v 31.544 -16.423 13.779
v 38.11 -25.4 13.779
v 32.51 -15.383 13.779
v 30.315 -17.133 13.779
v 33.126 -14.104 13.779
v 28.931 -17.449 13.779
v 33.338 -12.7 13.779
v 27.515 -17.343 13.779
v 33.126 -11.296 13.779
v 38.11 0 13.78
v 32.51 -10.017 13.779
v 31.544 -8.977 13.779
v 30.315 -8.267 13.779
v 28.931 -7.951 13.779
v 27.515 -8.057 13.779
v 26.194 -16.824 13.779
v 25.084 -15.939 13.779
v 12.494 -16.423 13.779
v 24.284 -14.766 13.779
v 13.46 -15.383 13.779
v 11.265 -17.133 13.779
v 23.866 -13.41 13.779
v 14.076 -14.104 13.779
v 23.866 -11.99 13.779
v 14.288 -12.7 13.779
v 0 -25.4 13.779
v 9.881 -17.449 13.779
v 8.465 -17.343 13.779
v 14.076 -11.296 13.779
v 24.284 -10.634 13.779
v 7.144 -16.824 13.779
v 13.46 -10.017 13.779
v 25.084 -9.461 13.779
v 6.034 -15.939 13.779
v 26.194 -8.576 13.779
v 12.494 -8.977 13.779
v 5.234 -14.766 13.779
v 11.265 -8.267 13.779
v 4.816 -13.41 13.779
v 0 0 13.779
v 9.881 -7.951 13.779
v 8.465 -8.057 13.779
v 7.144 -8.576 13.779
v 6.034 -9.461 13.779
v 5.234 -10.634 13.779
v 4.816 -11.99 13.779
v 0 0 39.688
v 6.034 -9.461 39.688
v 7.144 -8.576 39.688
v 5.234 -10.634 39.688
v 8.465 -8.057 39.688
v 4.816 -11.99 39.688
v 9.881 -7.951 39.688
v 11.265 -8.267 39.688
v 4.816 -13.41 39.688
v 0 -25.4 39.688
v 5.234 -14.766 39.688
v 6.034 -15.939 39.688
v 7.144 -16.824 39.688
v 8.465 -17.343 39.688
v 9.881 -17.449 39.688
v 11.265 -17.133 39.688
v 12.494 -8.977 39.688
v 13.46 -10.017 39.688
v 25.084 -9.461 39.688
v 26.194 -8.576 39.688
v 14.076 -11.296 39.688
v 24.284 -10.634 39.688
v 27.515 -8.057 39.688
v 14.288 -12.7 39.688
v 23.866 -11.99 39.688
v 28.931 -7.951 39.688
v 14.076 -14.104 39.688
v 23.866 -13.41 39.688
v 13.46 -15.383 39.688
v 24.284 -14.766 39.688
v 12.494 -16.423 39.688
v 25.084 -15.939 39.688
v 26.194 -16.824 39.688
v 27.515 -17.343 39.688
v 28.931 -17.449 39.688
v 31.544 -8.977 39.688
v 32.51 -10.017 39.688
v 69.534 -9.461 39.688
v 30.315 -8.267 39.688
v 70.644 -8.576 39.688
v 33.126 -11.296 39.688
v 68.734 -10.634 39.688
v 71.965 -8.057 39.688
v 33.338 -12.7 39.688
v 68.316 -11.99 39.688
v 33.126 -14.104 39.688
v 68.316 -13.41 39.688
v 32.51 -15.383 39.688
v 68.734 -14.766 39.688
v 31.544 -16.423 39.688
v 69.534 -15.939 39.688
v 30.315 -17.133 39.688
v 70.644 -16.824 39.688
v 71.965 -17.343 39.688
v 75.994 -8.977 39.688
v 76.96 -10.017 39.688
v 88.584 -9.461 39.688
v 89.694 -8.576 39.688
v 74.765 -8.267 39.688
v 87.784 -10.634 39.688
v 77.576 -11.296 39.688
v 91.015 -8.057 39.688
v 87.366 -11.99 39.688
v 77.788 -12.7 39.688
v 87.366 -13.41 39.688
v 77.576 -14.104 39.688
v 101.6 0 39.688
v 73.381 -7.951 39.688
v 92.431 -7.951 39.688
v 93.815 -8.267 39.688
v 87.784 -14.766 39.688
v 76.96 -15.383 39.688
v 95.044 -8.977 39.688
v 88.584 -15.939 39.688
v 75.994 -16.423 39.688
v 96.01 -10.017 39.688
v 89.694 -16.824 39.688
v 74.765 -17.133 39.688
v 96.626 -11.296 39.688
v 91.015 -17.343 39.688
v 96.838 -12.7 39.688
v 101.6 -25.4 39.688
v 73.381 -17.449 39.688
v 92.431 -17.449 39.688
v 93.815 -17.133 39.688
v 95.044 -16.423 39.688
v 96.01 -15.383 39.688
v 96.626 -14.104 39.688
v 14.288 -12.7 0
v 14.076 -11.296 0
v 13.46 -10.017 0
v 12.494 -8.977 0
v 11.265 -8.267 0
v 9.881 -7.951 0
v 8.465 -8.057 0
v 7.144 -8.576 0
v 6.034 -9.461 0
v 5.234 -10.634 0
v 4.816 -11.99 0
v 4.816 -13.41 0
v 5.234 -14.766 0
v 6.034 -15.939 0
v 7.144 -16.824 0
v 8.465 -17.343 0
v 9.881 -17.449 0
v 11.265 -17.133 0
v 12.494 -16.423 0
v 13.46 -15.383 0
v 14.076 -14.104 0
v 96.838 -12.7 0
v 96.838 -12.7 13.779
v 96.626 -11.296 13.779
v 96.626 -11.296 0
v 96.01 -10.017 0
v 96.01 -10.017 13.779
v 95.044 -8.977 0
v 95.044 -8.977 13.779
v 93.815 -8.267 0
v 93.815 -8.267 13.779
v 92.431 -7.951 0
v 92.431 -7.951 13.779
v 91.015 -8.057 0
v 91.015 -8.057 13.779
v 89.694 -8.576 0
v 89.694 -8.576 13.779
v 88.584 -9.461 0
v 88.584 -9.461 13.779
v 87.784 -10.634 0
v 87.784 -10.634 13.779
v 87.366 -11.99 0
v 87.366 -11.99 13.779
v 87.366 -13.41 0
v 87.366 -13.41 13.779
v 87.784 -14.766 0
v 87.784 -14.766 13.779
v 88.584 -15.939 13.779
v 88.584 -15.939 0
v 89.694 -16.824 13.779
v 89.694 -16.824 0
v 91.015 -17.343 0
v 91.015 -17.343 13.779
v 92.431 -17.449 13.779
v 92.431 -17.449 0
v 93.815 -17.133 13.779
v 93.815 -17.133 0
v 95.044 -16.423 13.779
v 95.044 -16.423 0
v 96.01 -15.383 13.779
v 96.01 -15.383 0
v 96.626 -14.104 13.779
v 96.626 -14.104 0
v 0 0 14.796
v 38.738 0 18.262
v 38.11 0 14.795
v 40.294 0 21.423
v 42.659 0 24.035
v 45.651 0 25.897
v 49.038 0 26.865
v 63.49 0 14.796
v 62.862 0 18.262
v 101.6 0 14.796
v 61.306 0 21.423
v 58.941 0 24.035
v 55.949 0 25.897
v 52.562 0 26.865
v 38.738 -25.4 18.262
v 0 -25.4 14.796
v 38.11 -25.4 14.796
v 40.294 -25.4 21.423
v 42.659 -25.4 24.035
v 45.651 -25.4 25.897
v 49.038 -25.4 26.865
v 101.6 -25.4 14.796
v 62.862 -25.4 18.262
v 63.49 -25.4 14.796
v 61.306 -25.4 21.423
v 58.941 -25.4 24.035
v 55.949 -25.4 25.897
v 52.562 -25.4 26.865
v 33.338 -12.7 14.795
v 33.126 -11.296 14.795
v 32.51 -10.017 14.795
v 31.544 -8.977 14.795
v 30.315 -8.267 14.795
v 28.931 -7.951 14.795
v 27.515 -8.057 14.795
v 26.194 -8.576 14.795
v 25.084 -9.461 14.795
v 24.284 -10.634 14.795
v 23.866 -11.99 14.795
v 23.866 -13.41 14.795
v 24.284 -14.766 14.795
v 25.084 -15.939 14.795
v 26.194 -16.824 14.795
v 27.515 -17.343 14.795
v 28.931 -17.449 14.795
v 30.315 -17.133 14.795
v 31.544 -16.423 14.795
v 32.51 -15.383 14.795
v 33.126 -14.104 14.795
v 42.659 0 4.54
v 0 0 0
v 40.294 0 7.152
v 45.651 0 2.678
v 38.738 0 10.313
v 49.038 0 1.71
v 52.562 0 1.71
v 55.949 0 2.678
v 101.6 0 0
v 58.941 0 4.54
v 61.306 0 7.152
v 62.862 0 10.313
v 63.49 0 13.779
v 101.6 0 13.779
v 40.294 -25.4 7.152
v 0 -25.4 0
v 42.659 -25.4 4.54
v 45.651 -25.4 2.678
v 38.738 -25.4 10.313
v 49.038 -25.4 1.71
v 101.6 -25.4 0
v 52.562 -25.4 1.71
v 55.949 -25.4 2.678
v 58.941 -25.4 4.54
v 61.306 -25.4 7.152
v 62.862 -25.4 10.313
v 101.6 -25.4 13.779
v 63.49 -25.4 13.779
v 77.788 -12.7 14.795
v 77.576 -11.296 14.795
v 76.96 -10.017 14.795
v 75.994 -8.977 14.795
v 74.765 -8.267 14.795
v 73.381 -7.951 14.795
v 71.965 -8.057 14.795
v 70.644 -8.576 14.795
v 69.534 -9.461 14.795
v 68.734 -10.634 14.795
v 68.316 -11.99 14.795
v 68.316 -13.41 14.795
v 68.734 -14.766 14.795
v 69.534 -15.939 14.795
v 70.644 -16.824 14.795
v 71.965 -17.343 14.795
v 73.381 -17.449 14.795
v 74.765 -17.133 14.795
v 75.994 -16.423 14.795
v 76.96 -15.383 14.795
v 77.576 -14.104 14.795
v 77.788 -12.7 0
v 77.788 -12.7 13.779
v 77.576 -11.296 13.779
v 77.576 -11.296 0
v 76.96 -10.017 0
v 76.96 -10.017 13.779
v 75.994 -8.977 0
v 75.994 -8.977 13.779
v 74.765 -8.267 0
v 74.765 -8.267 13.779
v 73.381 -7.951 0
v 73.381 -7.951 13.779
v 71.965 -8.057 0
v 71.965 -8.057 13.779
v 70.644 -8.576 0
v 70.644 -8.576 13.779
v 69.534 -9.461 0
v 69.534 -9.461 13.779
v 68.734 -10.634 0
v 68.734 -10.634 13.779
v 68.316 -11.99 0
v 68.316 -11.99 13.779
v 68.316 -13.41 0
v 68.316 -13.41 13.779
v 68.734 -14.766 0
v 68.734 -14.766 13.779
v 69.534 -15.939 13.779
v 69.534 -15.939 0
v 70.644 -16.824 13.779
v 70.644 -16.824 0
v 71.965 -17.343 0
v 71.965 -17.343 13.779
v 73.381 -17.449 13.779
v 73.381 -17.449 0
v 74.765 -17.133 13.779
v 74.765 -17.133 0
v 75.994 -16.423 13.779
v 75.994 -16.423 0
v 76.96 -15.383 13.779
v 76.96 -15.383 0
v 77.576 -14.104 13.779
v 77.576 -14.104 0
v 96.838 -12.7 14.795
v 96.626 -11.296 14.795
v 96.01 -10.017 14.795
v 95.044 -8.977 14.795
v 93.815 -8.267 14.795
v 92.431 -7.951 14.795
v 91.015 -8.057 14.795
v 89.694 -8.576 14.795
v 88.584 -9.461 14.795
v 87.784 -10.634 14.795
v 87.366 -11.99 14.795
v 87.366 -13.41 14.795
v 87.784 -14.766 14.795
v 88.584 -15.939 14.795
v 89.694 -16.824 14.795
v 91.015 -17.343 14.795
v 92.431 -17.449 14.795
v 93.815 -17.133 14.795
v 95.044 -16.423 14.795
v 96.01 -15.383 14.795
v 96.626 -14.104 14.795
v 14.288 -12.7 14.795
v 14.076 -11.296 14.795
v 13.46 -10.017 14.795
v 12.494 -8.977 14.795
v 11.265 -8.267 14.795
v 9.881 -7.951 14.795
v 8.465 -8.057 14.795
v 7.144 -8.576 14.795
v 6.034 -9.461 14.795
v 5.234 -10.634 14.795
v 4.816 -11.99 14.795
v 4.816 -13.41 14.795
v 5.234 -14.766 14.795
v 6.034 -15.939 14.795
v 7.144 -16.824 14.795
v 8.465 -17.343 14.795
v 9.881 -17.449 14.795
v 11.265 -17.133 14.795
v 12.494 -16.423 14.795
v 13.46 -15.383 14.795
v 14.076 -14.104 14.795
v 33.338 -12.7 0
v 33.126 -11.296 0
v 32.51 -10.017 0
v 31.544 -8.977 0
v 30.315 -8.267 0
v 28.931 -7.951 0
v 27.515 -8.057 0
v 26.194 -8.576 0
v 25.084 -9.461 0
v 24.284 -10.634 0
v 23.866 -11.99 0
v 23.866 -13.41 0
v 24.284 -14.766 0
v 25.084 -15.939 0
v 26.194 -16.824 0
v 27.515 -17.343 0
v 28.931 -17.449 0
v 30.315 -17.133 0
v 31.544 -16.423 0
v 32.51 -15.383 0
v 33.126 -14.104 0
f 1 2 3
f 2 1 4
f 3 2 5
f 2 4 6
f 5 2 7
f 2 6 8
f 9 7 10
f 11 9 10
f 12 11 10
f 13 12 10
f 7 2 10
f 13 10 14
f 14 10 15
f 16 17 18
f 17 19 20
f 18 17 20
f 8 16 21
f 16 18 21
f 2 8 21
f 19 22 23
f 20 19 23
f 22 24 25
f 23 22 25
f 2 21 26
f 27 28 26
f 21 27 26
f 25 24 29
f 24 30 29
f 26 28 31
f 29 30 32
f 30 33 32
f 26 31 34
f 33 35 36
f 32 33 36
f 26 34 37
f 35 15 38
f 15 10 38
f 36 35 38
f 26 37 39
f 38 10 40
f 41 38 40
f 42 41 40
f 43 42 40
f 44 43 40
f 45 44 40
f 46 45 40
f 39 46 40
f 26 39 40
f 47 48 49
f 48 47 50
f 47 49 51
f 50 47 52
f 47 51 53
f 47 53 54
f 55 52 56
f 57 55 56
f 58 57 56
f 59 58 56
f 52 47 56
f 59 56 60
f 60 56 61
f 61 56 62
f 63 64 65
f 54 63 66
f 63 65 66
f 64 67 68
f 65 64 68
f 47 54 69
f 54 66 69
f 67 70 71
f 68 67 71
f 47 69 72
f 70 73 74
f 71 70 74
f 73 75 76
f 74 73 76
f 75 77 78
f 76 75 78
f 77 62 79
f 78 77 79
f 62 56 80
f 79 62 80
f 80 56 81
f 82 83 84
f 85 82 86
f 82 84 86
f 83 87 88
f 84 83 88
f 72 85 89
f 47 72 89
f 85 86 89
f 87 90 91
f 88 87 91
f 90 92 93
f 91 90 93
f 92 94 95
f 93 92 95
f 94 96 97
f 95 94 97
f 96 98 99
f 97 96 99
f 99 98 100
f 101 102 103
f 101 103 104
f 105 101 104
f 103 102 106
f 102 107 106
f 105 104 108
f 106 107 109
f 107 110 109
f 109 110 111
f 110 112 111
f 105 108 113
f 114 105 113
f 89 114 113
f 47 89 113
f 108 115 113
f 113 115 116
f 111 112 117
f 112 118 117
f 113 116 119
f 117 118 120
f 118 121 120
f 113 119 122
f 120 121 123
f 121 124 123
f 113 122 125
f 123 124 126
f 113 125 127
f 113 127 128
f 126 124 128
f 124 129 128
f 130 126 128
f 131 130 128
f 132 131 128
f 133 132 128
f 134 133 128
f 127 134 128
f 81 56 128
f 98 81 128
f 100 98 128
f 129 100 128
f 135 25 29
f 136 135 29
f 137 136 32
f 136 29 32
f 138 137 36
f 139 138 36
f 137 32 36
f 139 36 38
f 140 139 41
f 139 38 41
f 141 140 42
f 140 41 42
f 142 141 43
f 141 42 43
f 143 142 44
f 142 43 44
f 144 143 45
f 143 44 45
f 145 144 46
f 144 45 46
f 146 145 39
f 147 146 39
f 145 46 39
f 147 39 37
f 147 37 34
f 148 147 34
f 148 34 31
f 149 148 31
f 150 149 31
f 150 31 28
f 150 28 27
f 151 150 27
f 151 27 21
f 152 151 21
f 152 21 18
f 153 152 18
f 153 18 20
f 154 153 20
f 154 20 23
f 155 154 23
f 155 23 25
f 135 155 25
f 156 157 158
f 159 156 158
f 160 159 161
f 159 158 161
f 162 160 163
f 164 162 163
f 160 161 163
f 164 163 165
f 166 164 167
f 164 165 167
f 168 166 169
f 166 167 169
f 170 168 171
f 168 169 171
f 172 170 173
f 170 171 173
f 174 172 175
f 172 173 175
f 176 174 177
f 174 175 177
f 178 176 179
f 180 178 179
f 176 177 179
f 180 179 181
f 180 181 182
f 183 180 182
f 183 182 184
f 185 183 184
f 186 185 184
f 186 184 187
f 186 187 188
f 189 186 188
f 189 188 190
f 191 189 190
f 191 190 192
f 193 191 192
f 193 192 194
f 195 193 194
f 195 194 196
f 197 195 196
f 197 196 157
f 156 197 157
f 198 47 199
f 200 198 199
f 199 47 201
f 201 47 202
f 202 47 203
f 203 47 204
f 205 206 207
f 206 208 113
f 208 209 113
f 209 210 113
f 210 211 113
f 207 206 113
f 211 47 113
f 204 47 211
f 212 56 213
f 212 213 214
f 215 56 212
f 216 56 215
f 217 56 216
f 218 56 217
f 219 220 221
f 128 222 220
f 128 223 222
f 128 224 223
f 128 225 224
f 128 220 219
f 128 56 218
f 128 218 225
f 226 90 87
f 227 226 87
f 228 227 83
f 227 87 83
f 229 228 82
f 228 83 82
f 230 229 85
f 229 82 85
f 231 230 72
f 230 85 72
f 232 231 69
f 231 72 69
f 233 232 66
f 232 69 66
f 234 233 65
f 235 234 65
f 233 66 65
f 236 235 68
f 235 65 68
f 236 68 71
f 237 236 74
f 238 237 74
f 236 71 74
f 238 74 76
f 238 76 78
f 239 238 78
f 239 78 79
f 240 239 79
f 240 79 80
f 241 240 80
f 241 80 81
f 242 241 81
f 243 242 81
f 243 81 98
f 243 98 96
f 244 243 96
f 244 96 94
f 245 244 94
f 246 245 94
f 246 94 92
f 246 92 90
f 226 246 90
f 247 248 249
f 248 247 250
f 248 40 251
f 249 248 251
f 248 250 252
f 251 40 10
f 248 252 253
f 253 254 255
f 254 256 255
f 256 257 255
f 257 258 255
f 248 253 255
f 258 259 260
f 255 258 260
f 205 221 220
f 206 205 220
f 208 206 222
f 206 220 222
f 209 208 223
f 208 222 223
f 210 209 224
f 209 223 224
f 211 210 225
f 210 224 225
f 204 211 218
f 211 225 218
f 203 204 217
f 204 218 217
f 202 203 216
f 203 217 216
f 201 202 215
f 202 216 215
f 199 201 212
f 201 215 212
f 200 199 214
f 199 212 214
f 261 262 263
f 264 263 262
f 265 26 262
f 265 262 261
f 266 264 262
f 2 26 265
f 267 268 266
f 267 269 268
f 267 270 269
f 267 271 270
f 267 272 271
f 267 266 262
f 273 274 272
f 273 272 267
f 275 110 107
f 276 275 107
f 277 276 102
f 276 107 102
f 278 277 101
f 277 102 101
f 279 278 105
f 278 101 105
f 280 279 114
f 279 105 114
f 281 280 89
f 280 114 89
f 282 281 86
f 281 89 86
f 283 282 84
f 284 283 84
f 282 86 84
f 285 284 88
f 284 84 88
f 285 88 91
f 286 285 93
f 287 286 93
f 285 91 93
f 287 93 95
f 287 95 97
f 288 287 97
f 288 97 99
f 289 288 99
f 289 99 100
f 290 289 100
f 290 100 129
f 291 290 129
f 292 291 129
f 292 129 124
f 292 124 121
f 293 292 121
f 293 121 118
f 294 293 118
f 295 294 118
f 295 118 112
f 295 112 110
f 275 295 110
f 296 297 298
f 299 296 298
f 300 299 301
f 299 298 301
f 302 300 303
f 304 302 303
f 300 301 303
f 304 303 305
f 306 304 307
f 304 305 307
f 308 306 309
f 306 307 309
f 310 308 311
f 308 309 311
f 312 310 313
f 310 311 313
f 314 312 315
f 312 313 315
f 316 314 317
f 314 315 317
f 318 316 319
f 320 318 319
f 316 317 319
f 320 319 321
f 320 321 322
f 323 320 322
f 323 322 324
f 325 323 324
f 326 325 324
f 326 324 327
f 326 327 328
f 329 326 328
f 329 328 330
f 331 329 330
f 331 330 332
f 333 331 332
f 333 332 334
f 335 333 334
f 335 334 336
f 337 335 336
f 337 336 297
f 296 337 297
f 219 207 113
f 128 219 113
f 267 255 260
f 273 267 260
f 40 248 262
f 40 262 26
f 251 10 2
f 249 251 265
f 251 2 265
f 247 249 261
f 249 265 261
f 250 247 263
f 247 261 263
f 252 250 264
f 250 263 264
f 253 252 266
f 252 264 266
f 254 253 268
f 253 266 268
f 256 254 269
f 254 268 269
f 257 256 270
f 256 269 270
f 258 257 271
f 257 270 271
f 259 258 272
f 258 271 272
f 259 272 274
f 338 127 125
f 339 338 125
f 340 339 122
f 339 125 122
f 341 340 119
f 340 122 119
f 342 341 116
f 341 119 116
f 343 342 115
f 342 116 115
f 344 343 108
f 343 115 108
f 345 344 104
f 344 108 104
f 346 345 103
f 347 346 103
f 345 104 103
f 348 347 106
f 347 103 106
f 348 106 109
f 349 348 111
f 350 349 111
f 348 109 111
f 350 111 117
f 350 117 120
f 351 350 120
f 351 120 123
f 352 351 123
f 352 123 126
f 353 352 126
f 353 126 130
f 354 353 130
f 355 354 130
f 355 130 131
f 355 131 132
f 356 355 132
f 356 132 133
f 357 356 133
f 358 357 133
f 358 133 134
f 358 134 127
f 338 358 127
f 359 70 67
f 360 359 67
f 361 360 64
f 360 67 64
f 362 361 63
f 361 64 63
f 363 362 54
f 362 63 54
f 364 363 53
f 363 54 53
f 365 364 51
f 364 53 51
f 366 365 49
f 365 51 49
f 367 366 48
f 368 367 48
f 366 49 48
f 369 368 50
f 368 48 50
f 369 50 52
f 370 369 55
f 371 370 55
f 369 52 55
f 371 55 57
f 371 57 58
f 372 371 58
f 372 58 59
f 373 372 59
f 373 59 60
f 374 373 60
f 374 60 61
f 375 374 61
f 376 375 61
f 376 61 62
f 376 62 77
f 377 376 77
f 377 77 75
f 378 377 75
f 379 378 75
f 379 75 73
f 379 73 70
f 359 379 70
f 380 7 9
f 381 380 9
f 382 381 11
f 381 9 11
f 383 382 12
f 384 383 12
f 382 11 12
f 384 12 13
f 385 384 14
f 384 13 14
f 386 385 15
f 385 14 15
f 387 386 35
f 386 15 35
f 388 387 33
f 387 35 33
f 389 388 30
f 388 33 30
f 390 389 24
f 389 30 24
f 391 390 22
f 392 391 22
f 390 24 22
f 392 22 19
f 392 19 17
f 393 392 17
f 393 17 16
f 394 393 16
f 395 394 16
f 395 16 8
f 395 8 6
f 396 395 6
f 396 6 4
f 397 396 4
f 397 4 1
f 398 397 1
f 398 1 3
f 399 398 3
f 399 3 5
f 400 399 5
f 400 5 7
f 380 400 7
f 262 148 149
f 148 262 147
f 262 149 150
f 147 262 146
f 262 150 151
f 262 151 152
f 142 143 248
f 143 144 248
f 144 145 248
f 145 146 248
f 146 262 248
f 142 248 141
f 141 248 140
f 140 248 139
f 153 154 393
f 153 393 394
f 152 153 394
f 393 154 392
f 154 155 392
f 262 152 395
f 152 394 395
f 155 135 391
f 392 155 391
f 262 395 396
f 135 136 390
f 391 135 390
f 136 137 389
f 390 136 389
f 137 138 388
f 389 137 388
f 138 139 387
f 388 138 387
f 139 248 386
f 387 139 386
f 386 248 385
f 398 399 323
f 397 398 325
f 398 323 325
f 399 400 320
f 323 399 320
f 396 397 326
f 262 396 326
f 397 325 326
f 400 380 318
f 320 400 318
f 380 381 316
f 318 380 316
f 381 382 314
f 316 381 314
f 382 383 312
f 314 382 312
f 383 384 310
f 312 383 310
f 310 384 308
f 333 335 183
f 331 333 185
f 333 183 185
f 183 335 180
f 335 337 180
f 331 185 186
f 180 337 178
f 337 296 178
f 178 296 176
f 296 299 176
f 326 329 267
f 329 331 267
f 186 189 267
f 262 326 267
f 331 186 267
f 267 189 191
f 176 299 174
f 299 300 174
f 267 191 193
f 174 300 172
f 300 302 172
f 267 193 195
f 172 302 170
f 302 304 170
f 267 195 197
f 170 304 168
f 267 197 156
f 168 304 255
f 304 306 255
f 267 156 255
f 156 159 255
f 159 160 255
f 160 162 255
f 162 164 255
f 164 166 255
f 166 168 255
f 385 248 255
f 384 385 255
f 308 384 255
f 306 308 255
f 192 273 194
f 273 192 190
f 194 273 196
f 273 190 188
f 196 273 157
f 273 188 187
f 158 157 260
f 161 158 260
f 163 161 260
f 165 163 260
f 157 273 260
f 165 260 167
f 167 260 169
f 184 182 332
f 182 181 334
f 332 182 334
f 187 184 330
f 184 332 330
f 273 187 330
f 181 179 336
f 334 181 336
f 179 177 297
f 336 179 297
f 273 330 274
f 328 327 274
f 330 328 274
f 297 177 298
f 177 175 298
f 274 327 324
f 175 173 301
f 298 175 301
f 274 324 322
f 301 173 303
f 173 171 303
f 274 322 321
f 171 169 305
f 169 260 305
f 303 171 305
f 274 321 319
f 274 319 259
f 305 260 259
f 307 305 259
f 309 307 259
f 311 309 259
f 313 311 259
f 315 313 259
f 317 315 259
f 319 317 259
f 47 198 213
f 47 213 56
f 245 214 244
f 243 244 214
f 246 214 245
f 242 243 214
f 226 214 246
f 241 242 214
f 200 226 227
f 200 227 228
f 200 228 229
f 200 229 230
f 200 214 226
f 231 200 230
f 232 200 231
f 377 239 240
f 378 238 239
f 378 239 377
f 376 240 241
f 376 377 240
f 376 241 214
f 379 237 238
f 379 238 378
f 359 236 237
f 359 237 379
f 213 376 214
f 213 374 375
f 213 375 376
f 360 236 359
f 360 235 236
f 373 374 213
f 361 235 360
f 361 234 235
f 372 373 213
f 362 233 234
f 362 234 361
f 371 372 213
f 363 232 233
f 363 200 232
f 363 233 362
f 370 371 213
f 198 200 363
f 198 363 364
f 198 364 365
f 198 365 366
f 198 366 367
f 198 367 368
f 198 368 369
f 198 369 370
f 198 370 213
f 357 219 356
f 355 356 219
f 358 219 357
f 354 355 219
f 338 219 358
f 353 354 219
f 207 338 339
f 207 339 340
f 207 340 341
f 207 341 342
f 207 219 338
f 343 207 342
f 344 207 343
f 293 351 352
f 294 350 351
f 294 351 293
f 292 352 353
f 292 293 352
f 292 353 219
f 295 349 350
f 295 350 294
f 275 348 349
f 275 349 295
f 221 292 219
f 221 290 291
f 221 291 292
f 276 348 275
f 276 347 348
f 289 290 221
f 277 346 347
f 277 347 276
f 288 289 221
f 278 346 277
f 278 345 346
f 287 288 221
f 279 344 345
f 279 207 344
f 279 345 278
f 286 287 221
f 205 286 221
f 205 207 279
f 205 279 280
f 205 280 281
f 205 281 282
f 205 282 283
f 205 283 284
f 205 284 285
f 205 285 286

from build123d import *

# Parameters (mm, degrees)
F0_W     = 101.6
F0_H     = 49.2125
F1_DEPTH = 25.4
F2_R     = 4.7625
F3_DEPTH = 50.17456
F4_R     = 12.7
F5_DEPTH = 25.401
F6_W     = 101.6
F6_H     = 1.016
F7_DEPTH = 25.401
F8_W     = 548.216532
F8_H     = 115.56996
F9_DEPTH = 25.4


with BuildPart() as f1:
    # F0 (on Front) → F1 (new body)
    with BuildSketch(Plane.XZ):
        with Locations((50.8, 24.60625)):
            Rectangle(F0_W, F0_H)
    extrude(amount=F1_DEPTH)

    # F2 (on face) → F3 (cut)
    with BuildSketch(Plane.XY.offset(49.2125)):
        with Locations((9.525, -12.7)):
            Circle(F2_R)
        with Locations((92.075, -12.7)):
            Circle(F2_R)
        with Locations((28.575, -12.7)):
            Circle(F2_R)
        with Locations((73.025, -12.7)):
            Circle(F2_R)
    extrude(amount=-F3_DEPTH, mode=Mode.SUBTRACT)

    # F4 (on face) → F5 (cut, through all)
    with BuildSketch(Plane.XZ.offset(25.4)):
        with Locations((50.8, 14.2875)):
            Circle(F4_R)
    extrude(amount=-F5_DEPTH, mode=Mode.SUBTRACT)

    # F6 (on face) → F7 (cut, through all)
    with BuildSketch(Plane(origin=(0, 0, 0), x_dir=(-1, 0, 0), z_dir=(0, 1, 0))):
        with Locations((-50.8, 14.2875)):
            Rectangle(F6_W, F6_H)
    extrude(amount=-F7_DEPTH, mode=Mode.SUBTRACT)

    # F8 (on face) → F9 (cut)
    with BuildSketch(Plane.XZ.offset(25.4)):
        with Locations((46.434156, 97.47248)):
            Rectangle(F8_W, F8_H)
    extrude(amount=-F9_DEPTH, mode=Mode.SUBTRACT)


solid = f1.part
